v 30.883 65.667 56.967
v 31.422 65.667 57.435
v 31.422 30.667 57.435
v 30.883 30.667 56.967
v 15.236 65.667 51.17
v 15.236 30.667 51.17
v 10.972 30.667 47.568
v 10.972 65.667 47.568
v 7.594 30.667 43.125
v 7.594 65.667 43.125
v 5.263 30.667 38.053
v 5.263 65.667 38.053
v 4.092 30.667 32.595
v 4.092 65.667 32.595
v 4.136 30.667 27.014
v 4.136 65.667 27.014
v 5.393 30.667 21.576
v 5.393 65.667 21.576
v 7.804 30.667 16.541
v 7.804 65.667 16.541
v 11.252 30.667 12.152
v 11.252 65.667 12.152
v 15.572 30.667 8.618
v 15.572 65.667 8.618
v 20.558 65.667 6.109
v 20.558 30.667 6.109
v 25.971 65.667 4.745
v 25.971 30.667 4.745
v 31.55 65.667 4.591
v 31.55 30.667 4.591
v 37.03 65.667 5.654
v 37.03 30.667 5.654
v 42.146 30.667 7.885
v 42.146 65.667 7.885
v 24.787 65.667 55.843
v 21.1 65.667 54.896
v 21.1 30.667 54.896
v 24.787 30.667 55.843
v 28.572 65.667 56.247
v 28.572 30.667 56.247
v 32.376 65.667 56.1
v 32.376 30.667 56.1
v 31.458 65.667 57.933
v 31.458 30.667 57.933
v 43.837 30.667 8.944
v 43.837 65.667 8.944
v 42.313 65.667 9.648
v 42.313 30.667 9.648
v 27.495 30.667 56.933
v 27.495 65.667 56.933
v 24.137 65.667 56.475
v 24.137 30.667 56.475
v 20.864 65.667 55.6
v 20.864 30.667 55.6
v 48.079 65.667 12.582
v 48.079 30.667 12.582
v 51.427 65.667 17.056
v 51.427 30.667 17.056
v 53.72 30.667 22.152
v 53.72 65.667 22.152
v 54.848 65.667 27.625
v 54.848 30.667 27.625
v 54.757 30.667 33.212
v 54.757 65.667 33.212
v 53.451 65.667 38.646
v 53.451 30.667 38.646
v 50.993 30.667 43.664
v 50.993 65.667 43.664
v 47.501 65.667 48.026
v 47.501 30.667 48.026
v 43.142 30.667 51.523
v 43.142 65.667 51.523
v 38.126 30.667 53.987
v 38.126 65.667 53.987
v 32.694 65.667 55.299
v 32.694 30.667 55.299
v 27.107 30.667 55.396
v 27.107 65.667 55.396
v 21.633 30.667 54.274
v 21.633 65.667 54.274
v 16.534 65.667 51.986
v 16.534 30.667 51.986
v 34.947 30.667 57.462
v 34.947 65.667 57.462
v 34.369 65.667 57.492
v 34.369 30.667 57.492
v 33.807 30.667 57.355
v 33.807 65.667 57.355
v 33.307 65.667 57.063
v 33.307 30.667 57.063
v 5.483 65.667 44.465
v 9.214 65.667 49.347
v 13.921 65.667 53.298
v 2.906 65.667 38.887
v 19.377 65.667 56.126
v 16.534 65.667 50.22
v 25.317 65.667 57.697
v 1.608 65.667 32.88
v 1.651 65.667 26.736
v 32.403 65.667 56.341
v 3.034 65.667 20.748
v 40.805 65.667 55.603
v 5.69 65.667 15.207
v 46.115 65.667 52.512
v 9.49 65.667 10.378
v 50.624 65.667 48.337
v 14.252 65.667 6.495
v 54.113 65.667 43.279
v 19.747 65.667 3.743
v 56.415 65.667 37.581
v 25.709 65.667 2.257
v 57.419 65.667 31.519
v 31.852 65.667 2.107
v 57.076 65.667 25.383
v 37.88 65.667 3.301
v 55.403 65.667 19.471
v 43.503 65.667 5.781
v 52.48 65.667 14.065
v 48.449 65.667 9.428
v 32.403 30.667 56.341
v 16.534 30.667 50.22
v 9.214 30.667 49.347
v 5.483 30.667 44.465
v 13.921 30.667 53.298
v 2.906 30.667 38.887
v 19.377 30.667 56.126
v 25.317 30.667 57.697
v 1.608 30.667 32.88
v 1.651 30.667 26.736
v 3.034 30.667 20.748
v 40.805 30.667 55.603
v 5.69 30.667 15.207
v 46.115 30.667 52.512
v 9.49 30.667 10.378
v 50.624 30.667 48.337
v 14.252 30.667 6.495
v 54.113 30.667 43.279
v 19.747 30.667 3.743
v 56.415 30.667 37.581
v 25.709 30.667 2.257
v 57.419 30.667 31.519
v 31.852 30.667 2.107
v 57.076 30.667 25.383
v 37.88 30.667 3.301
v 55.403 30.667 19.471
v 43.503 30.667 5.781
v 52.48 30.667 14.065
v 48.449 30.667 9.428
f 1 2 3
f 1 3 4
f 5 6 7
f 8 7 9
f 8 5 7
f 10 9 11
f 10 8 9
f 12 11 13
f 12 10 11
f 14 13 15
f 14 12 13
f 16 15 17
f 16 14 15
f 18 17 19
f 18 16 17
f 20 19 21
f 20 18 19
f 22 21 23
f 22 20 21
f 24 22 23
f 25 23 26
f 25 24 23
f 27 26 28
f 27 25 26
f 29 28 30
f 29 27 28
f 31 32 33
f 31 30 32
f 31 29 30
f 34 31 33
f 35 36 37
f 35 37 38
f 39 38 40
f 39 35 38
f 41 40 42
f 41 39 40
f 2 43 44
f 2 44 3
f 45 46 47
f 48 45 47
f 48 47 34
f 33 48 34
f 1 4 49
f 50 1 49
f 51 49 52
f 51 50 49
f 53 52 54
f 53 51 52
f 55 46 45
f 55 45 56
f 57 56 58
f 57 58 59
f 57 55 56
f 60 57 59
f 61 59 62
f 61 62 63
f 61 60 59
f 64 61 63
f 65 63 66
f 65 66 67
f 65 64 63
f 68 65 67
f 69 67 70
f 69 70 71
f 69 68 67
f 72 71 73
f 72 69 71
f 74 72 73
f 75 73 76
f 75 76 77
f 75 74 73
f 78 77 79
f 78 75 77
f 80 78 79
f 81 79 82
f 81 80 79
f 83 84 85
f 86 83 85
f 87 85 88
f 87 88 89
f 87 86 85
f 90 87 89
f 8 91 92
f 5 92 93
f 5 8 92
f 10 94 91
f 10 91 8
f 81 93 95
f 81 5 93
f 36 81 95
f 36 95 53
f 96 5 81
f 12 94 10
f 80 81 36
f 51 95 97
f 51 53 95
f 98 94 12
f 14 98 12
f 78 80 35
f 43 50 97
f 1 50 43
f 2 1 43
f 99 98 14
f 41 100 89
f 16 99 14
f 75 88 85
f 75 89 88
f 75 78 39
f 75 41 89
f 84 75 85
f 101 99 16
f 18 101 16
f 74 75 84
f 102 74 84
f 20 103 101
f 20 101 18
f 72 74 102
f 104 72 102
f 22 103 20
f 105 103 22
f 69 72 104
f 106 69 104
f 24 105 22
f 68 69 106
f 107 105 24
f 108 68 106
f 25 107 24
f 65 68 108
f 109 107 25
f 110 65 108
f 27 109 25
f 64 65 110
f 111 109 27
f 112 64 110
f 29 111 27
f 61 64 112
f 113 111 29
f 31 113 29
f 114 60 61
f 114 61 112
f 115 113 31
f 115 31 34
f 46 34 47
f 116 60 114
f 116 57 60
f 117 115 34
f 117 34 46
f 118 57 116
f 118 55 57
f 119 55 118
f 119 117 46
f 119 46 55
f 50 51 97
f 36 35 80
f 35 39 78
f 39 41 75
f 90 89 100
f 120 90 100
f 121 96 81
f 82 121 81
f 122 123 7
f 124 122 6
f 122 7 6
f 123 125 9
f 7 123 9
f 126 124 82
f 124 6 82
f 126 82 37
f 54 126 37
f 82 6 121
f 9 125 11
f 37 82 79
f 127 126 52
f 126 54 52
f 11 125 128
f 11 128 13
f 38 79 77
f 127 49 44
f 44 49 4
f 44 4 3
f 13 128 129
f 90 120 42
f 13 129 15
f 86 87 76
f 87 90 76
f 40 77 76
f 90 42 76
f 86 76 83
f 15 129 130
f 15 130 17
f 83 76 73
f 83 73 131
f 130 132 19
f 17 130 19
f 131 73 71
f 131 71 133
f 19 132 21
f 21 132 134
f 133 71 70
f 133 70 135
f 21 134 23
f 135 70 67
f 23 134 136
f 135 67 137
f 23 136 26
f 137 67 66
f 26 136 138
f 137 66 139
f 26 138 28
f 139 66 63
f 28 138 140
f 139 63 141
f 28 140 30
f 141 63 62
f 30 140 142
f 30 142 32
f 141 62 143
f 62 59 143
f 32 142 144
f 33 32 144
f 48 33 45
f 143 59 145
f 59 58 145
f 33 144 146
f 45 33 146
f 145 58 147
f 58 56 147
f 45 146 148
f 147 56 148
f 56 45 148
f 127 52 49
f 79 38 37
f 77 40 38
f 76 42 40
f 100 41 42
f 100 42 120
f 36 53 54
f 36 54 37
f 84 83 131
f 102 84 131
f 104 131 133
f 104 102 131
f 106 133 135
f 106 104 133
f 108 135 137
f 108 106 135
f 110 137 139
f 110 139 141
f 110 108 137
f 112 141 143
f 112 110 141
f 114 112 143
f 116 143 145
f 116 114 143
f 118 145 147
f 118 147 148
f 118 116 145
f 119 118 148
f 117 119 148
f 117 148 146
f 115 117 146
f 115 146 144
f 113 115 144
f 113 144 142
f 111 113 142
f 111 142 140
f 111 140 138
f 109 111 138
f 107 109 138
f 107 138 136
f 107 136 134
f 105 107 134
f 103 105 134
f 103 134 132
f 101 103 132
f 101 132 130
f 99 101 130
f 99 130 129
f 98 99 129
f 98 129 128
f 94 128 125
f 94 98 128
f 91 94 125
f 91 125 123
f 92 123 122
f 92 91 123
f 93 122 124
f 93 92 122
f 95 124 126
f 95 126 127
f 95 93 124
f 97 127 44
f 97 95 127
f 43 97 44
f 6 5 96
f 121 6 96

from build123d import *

# Parameters (mm, degrees)
SKETCH_1_R      = 25.5
EXTRUDE_1_DEPTH = 35
CHAMFER_1_SIZE  = 1.5
FILLET_1_R      = 2
CHAMFER_2_SIZE  = 0.5


with BuildPart() as part:
    # Эскиз1 → Бобышка-Вытянуть1 (new body)
    # profile 1 of 3: a face of its own
    with BuildSketch(Plane(origin=(0, 65.667309681, 0), x_dir=(-1, 0, 0), z_dir=(0, -1, 0))):
        with BuildLine():
            ThreePointArc((-32.569554052, -57.83154498), (-26.905120992, -2.121558707), (-31.457793139, -57.933399285))
            Line((-31.457793139, -57.933399285), (-31.386430924, -56.935948818))
            ThreePointArc((-31.386430924, -56.935948818), (-26.058947255, -56.789767316), (-20.863962526, -55.599983748))
            Line((-20.863962526, -55.599983748), (-21.100431285, -54.895855797))
            ThreePointArc((-21.100431285, -54.895855797), (-26.672454195, -56.113662764), (-32.375987665, -56.099553559))
            Line((-32.375987665, -56.099553559), (-32.569554052, -57.83154498))
        make_face()
        with Locations((-29.45965114, -30.004786206)):
            Circle(SKETCH_1_R, mode=Mode.SUBTRACT)
    # profile 2 of 3: a face of its own
    with BuildSketch(Plane(origin=(0, 65.667309681, 0), x_dir=(-1, 0, 0), z_dir=(0, -1, 0))):
        with BuildLine():
            ThreePointArc((-42.146247167, -7.884653267), (-43.001975074, -8.397947879), (-43.836965332, -8.944329501))
            Line((-43.836965332, -8.944329501), (-42.312872357, -9.648278017))
            Line((-42.312872357, -9.648278017), (-42.146247167, -7.884653267))
        make_face()
    # profile 3 of 3: a face of its own
    with BuildSketch(Plane(origin=(0, 65.667309681, 0), x_dir=(-1, 0, 0), z_dir=(0, -1, 0))):
        with BuildLine():
            Line((-16.534234919, -50.219751552), (-16.534234919, -51.986224182))
            ThreePointArc((-16.534234919, -51.986224182), (-15.879111186, -51.587625096), (-15.236269322, -51.169507079))
            Line((-15.236269322, -51.169507079), (-16.534234919, -50.219751552))
        make_face()
    extrude(amount=EXTRUDE_1_DEPTH)

    # Фаска1
    # the kernel refuses this chamfer: 1.5 mm, written as the material it takes off along each edge
    with BuildSketch(Plane(origin=(32.569554052, 69.524834163, 57.83154498), x_dir=(0.9905736381961588, 0, -0.13698126627690838), z_dir=(0, -1, 0))) as chamfer_1_piece_1:
        with BuildLine():
            Line((1.462313623, 0), (CHAMFER_1_SIZE * 0.0261127432615, -CHAMFER_1_SIZE * 0.999659004181))
            Line((CHAMFER_1_SIZE * 0.0261127432615, -CHAMFER_1_SIZE * 0.999659004181), (0, 0))
            ThreePointArc((0, 0), (0.751799837, 0.009540273), (1.462313623, 0))
        make_face()
    extrude(amount=42.715048964, mode=Mode.SUBTRACT)

    # Скругление1
    fillet_1_edges = [part.edges().sort_by_distance(p)[0] for p in [
        (34.018083377, 48.167309681, 57.631235408),
    ]]
    fillet(fillet_1_edges, radius=FILLET_1_R)

    # Фаска2
    # the kernel refuses this chamfer: 0.5 mm, written as the material it takes off along each edge
    with BuildSketch(Plane(origin=(31.386430924, 66.965316212, 56.935948818), x_dir=(0.0713622142429535, 0, 0.9974504671302444), z_dir=(0, -1, 0))) as chamfer_2_piece_1:
        with BuildLine():
            Line((CHAMFER_2_SIZE, 0), (-0.004717821, 0.504717821))
            ThreePointArc((-0.004717821, 0.504717821), (-0.001247153, 0.259508631), (0, 0))
            Line((0, 0), (CHAMFER_2_SIZE, 0))
        make_face()
    extrude(amount=37.596013061, mode=Mode.SUBTRACT)


solid = part.part
